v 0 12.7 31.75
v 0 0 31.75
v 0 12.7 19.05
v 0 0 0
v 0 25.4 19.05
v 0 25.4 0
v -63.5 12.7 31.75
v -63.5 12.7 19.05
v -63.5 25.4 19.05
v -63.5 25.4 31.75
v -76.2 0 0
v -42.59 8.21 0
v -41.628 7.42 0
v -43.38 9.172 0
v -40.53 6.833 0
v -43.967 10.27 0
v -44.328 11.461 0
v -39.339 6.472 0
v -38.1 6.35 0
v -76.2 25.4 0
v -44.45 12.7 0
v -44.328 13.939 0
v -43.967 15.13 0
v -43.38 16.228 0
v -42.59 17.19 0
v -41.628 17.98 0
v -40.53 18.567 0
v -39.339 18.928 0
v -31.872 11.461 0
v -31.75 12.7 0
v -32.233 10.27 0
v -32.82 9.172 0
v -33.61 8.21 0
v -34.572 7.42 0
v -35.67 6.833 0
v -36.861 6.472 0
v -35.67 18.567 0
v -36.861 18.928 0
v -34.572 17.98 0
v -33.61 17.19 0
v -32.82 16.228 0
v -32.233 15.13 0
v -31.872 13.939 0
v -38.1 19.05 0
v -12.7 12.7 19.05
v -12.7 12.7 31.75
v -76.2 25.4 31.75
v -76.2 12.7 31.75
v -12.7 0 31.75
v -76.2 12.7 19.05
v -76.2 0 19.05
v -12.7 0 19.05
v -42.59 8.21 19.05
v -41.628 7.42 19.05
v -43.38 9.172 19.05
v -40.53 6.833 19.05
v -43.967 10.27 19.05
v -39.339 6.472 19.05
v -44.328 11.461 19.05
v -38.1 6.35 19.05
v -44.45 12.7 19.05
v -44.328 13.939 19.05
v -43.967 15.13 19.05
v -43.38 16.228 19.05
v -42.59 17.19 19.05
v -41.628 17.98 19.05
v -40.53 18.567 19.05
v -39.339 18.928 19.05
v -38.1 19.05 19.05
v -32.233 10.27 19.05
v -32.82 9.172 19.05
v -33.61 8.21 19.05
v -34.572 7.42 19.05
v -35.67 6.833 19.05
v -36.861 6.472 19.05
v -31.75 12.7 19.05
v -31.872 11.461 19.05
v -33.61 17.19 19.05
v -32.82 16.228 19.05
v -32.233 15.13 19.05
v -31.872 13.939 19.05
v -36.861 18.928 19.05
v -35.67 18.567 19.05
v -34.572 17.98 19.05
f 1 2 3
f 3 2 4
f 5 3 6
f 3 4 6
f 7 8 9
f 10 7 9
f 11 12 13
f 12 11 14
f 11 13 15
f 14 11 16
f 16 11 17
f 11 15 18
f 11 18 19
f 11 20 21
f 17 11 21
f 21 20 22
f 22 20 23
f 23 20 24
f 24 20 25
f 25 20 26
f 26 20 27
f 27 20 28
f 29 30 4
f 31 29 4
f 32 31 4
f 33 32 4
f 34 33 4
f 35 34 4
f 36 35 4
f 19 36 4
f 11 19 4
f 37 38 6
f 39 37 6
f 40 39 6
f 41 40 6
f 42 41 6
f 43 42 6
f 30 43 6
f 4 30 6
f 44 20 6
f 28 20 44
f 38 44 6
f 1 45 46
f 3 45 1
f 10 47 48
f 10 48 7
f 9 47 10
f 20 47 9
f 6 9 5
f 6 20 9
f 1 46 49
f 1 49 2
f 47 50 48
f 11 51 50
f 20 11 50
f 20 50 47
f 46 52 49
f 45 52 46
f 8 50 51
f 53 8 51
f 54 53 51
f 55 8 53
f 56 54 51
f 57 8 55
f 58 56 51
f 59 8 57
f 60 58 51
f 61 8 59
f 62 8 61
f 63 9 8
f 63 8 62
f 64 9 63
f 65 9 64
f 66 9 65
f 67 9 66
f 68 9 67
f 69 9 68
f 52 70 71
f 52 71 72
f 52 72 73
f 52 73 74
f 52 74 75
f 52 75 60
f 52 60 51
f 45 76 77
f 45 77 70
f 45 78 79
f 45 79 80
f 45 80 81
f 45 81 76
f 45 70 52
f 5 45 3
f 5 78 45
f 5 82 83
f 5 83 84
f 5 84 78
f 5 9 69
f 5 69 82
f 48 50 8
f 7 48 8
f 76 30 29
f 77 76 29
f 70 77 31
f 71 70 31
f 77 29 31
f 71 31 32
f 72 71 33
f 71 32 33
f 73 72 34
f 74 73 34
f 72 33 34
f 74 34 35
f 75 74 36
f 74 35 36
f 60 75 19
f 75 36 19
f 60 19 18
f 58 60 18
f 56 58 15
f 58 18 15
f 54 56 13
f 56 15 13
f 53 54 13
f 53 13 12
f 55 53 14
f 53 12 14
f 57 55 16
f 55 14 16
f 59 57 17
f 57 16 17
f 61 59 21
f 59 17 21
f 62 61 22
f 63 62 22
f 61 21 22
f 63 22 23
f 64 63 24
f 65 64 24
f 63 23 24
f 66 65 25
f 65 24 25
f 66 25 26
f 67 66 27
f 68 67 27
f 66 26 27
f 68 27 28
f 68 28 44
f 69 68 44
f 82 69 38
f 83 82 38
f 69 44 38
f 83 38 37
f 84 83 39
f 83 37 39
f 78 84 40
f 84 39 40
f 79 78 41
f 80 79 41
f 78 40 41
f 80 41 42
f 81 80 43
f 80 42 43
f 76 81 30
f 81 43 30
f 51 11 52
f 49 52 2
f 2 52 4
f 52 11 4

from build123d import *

# Parameters (mm, degrees)
F0_W     = 76.2
F0_H     = 25.4
F1_DEPTH = 19.05
F2_W     = 12.7
F2_H     = 12.7
F3_DEPTH = 12.7
F4_R     = 6.35
F5_DEPTH = 19.05


with BuildPart() as f1:
    # F0 (on Top) → F1 (new body)
    with BuildSketch(Plane.XY):
        with Locations((-38.1, 12.7)):
            Rectangle(F0_W, F0_H)
    extrude(amount=F1_DEPTH)

    # F2 (on face) → F3 (join)
    with BuildSketch(Plane.XY.offset(19.05)):
        with Locations((-69.85, 19.05)):
            Rectangle(F2_W, F2_H)
        with Locations((-6.35, 6.35)):
            Rectangle(F2_W, F2_H)
    extrude(amount=F3_DEPTH)

    # F4 (on face) → F5 (cut)
    with BuildSketch(Plane(origin=(0, 0, 0), x_dir=(1, 0, 0), z_dir=(0, 0, -1))):
        with Locations((-38.1, -12.7)):
            Circle(F4_R)
    extrude(amount=-F5_DEPTH, mode=Mode.SUBTRACT)


solid = f1.part
